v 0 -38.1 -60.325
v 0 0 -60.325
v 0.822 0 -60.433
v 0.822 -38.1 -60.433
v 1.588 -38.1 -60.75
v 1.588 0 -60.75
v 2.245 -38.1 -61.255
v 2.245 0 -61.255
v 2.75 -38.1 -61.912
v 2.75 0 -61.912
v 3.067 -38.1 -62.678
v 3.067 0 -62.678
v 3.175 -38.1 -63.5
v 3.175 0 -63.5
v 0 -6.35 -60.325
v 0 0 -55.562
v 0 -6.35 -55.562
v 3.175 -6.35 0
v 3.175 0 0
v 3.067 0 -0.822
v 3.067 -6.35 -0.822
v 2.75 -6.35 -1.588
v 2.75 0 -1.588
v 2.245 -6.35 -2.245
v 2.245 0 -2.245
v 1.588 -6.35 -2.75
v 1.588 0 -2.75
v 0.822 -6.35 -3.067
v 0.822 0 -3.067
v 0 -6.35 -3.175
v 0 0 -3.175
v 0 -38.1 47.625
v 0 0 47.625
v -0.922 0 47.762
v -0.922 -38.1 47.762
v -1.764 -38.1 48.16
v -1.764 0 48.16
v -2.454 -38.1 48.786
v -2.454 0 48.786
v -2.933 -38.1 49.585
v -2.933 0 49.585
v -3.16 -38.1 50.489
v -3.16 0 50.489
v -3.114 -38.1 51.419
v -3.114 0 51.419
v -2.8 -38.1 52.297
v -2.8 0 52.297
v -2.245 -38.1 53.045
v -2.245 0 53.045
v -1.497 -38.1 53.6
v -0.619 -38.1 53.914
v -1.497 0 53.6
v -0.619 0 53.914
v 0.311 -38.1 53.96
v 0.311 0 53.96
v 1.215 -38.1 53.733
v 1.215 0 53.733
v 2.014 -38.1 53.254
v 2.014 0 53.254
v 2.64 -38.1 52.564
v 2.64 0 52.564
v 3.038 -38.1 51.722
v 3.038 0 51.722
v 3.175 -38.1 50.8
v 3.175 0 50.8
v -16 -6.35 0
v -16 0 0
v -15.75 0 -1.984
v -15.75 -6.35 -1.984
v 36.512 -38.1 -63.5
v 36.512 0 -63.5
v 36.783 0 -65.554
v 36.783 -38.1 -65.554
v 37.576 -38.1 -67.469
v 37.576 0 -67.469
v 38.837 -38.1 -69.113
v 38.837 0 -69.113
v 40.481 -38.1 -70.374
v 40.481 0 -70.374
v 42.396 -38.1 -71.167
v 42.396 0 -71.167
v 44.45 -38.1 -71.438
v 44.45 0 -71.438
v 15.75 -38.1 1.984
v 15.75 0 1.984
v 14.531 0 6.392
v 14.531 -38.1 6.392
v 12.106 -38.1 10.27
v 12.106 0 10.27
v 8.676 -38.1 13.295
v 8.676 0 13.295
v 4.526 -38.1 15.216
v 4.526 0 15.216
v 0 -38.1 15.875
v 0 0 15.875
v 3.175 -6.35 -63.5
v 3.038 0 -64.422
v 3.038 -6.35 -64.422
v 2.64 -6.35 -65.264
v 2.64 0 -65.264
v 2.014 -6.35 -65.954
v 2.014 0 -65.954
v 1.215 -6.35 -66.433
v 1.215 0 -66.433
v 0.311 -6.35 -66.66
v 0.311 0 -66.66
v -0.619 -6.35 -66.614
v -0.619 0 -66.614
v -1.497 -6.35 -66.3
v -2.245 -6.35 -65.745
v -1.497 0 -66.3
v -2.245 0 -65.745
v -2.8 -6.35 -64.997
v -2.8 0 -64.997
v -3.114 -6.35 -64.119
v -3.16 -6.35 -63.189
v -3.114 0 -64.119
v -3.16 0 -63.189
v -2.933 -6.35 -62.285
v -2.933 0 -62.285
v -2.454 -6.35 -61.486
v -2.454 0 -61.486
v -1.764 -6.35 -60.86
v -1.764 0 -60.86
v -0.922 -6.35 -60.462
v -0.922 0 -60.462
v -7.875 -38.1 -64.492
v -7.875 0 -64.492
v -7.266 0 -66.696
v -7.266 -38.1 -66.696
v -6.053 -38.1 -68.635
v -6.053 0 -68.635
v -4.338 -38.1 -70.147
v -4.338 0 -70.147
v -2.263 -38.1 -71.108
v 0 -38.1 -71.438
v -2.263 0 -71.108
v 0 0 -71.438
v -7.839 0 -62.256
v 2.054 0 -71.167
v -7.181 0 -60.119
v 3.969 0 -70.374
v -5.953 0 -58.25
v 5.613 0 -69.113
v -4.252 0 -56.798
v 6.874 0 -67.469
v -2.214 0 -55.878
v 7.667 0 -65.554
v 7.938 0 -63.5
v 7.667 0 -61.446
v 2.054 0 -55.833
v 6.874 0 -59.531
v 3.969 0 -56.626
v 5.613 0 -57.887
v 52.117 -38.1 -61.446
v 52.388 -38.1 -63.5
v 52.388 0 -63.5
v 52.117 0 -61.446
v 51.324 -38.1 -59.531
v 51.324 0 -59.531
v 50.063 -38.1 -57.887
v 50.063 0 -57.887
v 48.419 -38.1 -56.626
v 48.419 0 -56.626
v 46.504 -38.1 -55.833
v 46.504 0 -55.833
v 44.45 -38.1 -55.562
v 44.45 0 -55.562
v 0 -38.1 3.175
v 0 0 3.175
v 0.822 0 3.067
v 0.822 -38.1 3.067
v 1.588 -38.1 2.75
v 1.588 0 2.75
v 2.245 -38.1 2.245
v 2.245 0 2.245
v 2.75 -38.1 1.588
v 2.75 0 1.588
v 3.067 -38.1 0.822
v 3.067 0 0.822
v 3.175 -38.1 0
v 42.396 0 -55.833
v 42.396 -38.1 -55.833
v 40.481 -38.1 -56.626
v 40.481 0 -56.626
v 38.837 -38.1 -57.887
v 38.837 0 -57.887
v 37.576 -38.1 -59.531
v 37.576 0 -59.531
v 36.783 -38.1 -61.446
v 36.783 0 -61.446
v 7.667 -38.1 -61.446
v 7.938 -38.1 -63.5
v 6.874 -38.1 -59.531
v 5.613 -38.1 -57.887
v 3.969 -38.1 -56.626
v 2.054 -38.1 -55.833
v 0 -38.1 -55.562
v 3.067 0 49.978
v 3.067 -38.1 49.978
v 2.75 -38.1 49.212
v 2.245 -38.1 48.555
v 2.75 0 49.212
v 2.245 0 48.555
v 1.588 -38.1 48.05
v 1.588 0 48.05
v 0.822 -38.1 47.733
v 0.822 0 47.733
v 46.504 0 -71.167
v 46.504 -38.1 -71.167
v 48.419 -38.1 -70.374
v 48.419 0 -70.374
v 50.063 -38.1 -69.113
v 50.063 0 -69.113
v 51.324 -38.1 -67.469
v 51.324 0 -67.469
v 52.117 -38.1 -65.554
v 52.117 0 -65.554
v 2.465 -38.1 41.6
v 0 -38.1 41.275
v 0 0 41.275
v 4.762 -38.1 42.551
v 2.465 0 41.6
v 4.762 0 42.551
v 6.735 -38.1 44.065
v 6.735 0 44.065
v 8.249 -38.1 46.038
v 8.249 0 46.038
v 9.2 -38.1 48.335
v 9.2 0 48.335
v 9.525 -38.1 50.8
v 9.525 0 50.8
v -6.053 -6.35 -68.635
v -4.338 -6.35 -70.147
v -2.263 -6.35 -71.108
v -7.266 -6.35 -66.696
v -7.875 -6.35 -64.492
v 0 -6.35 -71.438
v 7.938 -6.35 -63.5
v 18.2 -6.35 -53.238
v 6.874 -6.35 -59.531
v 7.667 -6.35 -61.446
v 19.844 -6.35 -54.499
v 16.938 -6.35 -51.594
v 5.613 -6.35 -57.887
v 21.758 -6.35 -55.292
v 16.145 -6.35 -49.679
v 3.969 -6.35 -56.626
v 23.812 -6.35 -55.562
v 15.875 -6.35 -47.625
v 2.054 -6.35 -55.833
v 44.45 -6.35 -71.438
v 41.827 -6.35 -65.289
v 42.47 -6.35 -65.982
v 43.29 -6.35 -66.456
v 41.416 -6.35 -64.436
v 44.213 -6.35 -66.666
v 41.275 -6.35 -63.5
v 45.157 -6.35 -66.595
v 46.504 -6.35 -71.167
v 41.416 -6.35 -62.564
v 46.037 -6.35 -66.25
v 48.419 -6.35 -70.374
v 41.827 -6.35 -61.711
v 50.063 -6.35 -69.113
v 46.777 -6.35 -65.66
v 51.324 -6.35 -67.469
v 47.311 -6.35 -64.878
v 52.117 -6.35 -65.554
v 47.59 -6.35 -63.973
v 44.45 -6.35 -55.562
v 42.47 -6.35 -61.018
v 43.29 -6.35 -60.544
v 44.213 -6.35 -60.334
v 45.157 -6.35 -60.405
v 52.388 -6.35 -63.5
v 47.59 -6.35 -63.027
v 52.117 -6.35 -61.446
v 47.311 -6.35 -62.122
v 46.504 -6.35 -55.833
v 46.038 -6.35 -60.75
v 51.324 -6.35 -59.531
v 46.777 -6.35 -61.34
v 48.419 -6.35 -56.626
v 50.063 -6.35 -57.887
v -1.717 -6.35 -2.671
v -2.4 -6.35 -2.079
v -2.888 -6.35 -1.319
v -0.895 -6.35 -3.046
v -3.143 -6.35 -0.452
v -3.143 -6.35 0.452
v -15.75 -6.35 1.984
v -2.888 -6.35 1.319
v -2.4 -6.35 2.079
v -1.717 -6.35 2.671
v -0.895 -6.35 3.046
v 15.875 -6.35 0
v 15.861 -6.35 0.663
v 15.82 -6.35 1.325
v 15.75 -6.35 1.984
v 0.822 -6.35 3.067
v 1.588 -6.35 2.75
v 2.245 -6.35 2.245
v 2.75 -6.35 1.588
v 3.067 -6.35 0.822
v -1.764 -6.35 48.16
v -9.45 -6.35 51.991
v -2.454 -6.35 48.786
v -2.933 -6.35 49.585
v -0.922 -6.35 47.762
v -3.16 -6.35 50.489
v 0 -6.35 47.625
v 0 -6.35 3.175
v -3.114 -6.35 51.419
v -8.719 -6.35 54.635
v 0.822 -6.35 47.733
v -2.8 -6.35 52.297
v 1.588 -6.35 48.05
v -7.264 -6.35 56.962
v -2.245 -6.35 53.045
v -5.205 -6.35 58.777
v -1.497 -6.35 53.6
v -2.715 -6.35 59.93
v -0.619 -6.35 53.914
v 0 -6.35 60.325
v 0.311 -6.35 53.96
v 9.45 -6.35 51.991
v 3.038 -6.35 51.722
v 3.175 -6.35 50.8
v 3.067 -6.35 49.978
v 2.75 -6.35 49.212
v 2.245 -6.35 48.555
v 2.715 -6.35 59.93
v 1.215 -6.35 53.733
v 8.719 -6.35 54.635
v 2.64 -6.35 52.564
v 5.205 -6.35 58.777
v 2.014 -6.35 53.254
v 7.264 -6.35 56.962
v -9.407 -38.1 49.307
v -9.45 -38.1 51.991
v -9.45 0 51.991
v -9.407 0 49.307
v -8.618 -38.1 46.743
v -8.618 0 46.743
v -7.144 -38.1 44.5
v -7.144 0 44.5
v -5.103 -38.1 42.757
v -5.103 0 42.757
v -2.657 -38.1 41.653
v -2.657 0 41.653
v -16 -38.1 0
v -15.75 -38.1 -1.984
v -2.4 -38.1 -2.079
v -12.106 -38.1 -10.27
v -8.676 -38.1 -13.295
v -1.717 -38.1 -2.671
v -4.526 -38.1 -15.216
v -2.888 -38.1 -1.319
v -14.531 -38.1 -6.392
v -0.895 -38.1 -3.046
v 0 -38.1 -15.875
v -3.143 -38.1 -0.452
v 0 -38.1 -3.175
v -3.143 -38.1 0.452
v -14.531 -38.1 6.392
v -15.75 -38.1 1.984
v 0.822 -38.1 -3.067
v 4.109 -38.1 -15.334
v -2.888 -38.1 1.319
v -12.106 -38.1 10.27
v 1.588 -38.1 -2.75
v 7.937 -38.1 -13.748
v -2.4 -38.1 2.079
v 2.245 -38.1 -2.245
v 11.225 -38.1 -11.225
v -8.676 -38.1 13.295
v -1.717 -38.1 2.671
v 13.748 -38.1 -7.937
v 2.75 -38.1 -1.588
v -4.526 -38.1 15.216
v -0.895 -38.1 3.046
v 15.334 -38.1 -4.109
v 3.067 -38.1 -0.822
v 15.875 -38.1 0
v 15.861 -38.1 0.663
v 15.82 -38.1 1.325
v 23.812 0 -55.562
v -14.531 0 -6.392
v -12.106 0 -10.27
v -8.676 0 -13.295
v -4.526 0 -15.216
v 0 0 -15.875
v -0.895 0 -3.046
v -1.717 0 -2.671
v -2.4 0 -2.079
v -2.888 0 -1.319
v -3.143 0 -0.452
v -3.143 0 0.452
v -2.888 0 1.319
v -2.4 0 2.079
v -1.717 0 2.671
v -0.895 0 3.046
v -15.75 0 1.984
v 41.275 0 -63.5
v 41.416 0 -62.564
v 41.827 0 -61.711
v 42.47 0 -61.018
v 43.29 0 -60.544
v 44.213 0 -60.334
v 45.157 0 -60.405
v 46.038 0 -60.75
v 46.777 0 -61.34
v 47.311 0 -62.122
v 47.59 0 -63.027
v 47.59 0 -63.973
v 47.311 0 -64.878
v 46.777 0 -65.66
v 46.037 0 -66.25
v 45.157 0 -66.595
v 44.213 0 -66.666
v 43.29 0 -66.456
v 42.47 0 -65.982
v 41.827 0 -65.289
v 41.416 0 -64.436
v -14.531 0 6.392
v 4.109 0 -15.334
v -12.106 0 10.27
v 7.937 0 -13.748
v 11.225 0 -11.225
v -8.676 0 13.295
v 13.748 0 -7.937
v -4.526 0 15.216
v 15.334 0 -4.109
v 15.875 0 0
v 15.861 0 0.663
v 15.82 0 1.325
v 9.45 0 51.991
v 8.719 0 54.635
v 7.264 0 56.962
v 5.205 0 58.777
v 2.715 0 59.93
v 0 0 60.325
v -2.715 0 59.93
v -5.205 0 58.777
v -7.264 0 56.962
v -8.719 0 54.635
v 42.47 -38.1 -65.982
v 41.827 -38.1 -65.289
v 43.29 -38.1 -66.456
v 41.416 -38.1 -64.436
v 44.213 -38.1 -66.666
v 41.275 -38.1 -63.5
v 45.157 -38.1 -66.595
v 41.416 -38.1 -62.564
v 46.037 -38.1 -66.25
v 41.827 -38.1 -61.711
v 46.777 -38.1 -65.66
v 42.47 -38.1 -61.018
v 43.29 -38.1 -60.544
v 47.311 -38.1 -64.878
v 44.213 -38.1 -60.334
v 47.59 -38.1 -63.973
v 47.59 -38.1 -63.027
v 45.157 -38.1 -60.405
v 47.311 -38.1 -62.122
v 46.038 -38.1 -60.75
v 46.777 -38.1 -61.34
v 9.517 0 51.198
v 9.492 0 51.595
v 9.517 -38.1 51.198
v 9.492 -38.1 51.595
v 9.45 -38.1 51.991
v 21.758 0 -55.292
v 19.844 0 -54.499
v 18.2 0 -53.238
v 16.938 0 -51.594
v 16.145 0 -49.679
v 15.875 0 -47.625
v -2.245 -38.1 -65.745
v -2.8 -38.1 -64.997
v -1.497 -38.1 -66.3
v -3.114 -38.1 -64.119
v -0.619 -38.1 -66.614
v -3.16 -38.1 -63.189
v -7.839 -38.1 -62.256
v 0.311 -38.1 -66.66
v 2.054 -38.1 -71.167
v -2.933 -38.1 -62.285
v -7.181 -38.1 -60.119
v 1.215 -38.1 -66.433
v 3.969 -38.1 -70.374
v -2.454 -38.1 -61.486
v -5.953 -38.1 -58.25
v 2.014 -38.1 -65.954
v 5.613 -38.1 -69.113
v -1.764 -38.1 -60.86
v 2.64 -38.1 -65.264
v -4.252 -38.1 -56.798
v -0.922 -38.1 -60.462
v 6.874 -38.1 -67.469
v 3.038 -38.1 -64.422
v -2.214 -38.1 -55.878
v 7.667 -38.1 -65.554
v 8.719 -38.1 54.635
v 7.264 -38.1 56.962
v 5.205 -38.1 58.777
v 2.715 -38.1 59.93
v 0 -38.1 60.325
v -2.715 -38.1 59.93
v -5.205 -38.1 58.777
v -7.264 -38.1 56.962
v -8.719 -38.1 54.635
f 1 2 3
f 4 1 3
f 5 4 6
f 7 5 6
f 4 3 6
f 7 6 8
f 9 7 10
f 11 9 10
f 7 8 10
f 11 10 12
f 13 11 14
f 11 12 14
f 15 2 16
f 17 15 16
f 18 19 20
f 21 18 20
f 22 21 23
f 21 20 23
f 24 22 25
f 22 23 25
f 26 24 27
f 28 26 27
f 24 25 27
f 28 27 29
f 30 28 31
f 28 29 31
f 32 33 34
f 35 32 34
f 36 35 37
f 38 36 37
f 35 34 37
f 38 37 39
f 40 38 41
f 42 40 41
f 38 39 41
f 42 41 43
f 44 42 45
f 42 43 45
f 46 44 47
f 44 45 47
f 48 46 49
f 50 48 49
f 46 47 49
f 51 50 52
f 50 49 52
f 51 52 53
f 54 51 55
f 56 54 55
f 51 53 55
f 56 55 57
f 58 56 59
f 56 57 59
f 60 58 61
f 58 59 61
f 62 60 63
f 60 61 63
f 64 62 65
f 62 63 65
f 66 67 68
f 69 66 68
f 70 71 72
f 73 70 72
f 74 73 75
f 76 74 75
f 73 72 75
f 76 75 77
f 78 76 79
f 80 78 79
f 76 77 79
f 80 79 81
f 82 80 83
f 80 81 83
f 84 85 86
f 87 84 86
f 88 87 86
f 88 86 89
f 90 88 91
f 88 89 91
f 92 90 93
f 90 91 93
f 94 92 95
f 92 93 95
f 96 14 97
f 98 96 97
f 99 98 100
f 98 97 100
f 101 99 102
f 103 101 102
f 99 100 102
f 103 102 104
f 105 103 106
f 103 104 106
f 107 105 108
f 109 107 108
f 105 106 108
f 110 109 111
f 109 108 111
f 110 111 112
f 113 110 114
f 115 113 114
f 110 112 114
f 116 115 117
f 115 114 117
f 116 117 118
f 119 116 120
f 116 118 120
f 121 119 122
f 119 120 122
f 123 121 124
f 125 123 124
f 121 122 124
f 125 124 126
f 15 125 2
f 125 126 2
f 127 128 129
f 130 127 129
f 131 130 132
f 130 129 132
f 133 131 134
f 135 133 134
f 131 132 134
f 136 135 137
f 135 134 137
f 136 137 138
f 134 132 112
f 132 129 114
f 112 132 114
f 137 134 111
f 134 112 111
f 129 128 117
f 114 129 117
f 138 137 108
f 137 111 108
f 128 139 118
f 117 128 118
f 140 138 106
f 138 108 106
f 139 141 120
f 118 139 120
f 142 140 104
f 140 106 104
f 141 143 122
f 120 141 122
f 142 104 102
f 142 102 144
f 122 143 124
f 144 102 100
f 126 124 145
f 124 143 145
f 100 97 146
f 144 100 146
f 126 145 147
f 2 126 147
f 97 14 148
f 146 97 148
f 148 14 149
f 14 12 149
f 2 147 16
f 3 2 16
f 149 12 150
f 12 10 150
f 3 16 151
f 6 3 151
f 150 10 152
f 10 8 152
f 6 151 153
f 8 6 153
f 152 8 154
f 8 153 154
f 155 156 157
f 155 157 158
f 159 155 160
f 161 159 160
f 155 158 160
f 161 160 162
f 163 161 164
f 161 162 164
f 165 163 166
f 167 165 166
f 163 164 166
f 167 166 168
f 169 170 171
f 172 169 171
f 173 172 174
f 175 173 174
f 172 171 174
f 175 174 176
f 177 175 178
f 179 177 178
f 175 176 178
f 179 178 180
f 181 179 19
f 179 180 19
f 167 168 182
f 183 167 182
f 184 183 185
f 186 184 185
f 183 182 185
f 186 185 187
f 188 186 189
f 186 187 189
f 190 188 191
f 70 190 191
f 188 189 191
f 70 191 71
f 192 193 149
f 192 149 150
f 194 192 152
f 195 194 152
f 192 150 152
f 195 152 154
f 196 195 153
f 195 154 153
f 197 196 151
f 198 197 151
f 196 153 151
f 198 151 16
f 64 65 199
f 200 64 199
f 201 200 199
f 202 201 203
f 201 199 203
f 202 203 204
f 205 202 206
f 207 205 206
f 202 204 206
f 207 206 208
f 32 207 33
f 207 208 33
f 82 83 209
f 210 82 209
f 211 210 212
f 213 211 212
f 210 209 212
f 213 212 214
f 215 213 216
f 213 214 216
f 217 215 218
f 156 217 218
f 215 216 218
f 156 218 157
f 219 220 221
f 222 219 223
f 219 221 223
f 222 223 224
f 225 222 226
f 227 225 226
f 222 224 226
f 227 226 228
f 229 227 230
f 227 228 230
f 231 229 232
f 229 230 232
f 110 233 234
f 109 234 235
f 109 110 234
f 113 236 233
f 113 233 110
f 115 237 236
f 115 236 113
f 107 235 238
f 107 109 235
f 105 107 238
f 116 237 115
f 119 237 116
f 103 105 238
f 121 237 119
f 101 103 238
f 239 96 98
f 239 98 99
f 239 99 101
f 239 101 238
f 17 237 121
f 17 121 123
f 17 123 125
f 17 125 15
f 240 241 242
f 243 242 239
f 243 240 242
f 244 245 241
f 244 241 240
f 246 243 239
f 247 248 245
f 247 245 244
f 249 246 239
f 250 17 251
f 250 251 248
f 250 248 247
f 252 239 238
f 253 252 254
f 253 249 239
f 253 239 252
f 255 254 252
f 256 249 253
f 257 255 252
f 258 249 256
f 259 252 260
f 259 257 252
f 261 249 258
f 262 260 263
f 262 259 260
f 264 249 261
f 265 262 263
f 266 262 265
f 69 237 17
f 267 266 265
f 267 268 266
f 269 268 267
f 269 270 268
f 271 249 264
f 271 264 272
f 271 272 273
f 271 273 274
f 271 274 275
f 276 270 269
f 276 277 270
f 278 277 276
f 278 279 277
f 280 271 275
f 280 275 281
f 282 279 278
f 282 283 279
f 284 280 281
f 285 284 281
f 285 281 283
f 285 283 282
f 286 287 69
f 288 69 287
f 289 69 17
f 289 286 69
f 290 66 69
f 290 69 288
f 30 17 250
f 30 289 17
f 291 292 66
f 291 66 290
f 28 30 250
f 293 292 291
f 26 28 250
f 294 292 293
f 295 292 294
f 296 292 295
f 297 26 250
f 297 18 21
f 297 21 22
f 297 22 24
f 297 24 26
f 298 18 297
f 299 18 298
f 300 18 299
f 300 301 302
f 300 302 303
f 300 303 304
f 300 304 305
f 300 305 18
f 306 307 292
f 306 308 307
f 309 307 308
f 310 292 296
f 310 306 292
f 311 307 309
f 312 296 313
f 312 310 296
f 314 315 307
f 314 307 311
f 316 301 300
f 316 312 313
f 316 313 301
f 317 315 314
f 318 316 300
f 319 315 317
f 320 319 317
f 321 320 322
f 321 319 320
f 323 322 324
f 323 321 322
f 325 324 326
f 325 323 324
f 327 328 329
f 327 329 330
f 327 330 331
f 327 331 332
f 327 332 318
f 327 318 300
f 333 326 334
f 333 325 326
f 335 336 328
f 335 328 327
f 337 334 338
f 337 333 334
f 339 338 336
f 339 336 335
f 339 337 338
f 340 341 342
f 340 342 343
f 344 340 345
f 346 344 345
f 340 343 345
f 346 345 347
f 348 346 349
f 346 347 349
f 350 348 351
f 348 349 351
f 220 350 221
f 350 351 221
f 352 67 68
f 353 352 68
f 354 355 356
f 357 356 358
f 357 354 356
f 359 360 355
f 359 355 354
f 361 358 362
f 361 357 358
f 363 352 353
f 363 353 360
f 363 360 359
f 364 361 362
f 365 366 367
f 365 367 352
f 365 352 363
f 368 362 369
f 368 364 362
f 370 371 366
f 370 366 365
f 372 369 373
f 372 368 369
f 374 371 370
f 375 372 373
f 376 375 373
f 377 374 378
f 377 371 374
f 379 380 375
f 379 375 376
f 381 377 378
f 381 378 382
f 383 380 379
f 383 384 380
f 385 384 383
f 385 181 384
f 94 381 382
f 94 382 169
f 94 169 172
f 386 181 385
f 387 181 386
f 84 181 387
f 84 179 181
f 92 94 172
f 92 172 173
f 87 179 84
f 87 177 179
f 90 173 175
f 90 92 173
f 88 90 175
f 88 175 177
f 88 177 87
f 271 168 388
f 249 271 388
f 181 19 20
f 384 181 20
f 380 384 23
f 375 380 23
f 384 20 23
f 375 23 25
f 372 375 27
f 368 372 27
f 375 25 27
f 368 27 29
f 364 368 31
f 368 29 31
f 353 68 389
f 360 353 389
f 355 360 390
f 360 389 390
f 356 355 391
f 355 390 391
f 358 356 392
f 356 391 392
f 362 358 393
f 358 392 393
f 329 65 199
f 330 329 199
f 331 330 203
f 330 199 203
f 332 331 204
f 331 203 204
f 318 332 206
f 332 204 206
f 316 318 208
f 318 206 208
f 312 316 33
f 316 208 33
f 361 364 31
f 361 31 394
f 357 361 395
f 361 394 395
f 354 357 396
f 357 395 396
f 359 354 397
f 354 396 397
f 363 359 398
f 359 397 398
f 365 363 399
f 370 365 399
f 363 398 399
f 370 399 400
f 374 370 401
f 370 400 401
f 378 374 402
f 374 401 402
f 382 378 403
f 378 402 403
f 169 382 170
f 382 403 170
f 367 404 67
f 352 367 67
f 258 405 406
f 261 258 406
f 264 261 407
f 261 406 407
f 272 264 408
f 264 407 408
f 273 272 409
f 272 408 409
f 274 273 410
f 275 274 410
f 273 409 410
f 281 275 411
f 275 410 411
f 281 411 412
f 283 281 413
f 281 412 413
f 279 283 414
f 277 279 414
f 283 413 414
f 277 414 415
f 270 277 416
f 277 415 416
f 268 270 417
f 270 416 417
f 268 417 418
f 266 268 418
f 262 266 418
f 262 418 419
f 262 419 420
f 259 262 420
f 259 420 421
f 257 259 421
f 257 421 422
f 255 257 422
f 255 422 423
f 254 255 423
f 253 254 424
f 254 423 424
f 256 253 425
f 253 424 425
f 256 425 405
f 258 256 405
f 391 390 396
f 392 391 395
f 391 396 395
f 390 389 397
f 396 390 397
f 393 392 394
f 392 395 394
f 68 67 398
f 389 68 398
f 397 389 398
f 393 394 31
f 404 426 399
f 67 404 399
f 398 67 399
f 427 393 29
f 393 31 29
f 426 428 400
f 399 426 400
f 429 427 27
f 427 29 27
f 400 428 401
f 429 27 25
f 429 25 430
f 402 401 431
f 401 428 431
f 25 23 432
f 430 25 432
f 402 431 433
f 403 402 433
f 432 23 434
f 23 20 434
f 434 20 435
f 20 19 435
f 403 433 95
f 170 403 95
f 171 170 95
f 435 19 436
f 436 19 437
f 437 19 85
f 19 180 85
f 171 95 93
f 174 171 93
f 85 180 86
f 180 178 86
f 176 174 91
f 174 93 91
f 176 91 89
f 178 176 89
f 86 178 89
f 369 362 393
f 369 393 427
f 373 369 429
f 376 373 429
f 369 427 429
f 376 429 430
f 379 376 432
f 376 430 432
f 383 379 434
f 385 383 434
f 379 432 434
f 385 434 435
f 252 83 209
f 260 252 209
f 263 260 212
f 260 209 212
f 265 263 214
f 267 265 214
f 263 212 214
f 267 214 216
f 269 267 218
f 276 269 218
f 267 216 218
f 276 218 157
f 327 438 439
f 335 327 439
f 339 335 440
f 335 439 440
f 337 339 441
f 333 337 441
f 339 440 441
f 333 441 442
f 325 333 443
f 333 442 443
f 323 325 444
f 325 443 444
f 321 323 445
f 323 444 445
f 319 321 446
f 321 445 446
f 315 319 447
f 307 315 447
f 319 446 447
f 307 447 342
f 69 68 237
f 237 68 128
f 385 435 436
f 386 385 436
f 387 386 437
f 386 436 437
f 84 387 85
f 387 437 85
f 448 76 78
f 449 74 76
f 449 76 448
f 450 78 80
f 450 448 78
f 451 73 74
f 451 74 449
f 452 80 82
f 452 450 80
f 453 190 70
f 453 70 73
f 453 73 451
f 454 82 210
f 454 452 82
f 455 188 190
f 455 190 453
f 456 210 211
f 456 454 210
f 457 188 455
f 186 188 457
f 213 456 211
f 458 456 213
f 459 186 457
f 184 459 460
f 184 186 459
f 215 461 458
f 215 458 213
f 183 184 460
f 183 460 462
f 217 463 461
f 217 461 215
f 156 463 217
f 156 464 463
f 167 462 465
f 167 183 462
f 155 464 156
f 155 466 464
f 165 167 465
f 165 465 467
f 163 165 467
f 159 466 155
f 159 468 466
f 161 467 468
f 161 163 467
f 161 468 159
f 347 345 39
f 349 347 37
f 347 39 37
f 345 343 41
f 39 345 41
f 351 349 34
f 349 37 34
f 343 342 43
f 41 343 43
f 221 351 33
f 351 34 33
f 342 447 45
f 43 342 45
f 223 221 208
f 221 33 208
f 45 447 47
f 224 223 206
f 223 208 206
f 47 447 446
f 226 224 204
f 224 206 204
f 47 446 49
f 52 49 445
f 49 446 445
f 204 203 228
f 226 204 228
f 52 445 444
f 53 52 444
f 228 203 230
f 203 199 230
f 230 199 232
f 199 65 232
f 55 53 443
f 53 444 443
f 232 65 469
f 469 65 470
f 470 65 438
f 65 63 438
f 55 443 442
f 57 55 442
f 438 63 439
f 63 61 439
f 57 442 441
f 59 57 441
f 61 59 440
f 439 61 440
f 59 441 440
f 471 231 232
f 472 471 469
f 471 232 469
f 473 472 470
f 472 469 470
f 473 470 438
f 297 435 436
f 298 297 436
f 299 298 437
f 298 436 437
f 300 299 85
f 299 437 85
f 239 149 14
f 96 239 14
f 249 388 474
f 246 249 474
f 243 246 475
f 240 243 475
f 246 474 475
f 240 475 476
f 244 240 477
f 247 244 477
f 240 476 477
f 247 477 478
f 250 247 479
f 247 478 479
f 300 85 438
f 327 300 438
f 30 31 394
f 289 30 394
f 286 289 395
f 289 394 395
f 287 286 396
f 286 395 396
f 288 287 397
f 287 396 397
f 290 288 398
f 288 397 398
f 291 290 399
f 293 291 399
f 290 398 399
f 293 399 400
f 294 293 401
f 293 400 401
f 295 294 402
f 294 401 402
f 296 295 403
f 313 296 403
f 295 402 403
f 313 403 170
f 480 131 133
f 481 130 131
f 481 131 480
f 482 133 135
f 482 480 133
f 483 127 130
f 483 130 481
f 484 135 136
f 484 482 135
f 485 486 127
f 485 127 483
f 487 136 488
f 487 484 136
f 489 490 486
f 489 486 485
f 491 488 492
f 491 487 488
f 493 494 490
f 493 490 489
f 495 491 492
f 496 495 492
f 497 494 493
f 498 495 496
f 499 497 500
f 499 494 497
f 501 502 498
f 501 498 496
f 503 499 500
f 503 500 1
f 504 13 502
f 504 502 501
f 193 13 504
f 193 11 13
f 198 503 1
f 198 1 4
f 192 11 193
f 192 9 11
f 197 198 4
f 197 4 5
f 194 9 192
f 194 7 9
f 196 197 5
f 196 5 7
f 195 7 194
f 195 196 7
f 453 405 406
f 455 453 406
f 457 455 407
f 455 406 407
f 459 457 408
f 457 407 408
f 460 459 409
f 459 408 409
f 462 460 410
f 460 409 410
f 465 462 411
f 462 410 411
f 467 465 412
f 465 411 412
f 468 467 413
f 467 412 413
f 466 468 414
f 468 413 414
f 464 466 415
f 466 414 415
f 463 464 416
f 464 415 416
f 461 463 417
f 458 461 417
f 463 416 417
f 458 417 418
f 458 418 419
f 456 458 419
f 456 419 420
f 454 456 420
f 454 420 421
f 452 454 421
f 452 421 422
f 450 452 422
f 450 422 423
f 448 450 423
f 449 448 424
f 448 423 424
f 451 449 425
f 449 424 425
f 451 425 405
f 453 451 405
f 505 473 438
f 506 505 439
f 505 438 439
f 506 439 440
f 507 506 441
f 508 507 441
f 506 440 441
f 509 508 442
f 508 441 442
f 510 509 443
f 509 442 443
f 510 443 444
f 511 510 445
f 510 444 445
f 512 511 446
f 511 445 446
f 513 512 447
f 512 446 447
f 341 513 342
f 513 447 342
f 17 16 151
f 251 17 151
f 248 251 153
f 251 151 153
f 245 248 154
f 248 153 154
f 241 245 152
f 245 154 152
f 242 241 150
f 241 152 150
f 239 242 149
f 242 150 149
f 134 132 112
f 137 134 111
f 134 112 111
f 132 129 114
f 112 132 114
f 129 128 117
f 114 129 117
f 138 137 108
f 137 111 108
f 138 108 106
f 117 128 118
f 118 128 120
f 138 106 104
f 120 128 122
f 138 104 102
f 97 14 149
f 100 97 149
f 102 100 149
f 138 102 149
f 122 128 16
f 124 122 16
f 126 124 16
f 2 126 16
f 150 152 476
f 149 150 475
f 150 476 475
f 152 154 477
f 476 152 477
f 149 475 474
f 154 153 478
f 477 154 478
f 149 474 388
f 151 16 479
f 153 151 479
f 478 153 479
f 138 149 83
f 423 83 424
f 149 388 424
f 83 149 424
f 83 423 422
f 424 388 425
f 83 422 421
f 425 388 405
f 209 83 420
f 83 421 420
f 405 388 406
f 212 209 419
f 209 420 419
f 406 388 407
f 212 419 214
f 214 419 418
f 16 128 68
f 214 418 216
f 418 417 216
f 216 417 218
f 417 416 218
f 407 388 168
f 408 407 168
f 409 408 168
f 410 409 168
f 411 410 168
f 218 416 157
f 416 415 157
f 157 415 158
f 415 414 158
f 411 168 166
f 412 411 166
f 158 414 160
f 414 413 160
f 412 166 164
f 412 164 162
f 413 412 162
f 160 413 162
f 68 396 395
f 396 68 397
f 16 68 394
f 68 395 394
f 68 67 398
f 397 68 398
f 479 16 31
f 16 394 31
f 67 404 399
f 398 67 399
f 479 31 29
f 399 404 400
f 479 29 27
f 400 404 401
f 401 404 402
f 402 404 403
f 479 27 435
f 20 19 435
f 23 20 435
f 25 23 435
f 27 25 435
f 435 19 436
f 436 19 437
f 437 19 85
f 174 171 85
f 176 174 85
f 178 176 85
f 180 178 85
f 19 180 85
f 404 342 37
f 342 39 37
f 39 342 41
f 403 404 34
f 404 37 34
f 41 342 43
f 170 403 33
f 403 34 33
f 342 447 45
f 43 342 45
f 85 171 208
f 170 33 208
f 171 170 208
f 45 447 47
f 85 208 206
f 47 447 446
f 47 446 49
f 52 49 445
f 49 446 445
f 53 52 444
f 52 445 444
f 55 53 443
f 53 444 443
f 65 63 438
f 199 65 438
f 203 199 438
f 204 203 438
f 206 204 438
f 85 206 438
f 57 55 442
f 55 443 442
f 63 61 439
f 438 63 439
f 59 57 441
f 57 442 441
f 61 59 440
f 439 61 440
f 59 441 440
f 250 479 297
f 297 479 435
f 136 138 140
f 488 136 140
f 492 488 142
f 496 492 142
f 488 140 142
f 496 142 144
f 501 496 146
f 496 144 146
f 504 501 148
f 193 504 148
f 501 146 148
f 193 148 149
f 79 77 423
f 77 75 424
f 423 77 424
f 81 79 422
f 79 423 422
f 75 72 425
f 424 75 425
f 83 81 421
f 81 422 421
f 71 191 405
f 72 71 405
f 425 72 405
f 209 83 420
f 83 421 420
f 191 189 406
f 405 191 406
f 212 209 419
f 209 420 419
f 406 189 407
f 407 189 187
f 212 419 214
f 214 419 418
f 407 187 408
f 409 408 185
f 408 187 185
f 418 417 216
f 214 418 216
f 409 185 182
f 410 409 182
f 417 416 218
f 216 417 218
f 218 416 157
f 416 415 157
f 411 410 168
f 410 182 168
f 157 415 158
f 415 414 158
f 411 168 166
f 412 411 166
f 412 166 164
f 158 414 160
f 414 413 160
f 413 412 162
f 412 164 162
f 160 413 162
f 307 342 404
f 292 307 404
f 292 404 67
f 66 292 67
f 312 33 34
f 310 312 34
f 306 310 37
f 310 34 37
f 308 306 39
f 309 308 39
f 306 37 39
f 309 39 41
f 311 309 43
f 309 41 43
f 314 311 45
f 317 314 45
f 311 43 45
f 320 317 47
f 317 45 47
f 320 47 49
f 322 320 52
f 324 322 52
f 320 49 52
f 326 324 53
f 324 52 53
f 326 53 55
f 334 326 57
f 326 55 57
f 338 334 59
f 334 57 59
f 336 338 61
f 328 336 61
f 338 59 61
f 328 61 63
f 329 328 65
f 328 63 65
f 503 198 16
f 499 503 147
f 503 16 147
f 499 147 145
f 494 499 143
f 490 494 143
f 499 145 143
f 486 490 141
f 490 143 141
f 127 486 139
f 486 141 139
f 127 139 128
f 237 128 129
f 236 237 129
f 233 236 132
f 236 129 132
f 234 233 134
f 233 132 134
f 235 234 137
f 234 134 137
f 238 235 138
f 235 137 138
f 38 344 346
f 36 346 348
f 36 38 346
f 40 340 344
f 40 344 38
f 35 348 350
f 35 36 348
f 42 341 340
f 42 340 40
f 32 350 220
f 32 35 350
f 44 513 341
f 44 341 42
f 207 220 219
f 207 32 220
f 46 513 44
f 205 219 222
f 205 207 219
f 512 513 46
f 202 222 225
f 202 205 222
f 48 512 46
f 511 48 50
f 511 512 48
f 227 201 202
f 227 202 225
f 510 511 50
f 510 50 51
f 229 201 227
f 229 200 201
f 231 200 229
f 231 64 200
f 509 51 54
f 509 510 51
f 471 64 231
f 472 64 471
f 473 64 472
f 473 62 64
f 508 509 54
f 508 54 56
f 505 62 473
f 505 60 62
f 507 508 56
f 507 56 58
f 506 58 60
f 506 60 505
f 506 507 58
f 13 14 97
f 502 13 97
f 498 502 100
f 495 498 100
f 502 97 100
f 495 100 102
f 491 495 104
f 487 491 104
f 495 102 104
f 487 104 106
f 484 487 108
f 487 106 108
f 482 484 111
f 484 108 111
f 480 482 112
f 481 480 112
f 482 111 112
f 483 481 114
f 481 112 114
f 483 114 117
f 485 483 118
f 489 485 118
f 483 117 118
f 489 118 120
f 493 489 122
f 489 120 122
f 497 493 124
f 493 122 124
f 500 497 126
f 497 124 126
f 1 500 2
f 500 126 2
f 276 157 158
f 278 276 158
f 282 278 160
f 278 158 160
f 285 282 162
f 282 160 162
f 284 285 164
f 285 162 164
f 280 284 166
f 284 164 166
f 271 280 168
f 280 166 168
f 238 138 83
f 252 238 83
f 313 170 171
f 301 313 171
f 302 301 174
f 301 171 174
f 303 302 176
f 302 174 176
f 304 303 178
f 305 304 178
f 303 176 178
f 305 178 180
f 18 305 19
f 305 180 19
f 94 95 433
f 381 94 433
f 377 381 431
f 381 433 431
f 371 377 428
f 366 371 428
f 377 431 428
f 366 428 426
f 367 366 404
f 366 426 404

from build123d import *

# Parameters (mm, degrees)
F1_DEPTH = 38.1
F2_DEPTH = 6.35


with BuildPart() as f1:
    # F0 (on Front) → F1 (new body)
    with BuildSketch(Plane.XZ):
        with BuildLine():
            Line((-16.0004960241, 0), (-15.7504882823, -1.9843749313))
            ThreePointArc((-15.7504882823, -1.9843749313), (-15.875, -3.16e-08), (-15.7504882902, 1.9843748686))
            Line((-15.7504882902, 1.9843748686), (-16.0004960241, 0))
        make_face()
        with BuildLine():
            ThreePointArc((0, -15.875), (11.2253201513, -11.2253201513), (15.875, 0))
            ThreePointArc((15.875, 0), (15.8438414895, 0.9941387503), (15.7504882702, 1.9843750273))
            ThreePointArc((15.7504882702, 1.9843750273), (10.5003255055, 11.9062500091), (0, 15.875))
            Line((0, 15.875), (0, 3.175))
            ThreePointArc((0, 3.175), (2.2450640303, 2.2450640303), (3.175, 0))
            ThreePointArc((3.175, 0), (2.2450640303, -2.2450640303), (0, -3.175))
            Line((0, -3.175), (0, -15.875))
        make_face()
        with BuildLine():
            ThreePointArc((-15.7504882823, -1.9843749313), (-10.5003255418, -11.9062499771), (0, -15.875))
            Line((0, -15.875), (0, -3.175))
            ThreePointArc((0, -3.175), (-3.175, 0), (0, 3.175))
            Line((0, 3.175), (0, 15.875))
            ThreePointArc((0, 15.875), (-10.5003255655, 11.9062499562), (-15.7504882902, 1.9843748686))
            ThreePointArc((-15.7504882902, 1.9843748686), (-15.875, -3.16e-08), (-15.7504882823, -1.9843749313))
        make_face()
    extrude(amount=F1_DEPTH)


with BuildPart() as f1b:
    # F0 (on Front) → F1, piece 2 (new body)
    with BuildSketch(Plane.XZ):
        with BuildLine():
            ThreePointArc((9.525, 50.8), (9.5063048942, 51.396483242), (9.4502929642, 51.990625))
            ThreePointArc((9.4502929642, 51.990625), (0, 60.325), (-9.4502929642, 51.990625))
            ThreePointArc((-9.4502929642, 51.990625), (-7.14375, 44.4998046905), (0, 41.275))
            ThreePointArc((0, 41.275), (6.7351920908, 44.0648079092), (9.525, 50.8))
        make_face()
        with BuildLine():
            ThreePointArc((3.175, 50.8), (2.2450640303, 48.5549359697), (0, 47.625))
            ThreePointArc((0, 47.625), (-2.2450640303, 53.0450640303), (3.175, 50.8))
        make_face(mode=Mode.SUBTRACT)
    extrude(amount=F1_DEPTH)


with BuildPart() as f1c:
    # F0 (on Front) → F1, piece 3 (new body)
    with BuildSketch(Plane.XZ):
        with BuildLine():
            ThreePointArc((52.3875, -63.5), (50.0626600757, -57.8873399243), (44.45, -55.5625))
            ThreePointArc((44.45, -55.5625), (38.8373399243, -57.8873399243), (36.5125, -63.5))
            ThreePointArc((36.5125, -63.5), (38.8373399243, -69.1126600757), (44.45, -71.4375))
            ThreePointArc((44.45, -71.4375), (50.0626600757, -69.1126600757), (52.3875, -63.5))
        make_face()
        with BuildLine():
            ThreePointArc((47.625, -63.5), (44.45, -66.675), (41.275, -63.5))
            ThreePointArc((41.275, -63.5), (44.45, -60.325), (47.625, -63.5))
        make_face(mode=Mode.SUBTRACT)
    extrude(amount=F1_DEPTH)


with BuildPart() as f1d:
    # F0 (on Front) → F1, piece 4 (new body)
    with BuildSketch(Plane.XZ):
        with BuildLine():
            Line((0, -60.325), (0, -55.5625))
            ThreePointArc((0, -55.5625), (-5.953125, -58.2498372421), (-7.8752441368, -64.4921875))
            ThreePointArc((-7.8752441368, -64.4921875), (-5.2501627579, -69.453125), (0, -71.4375))
            ThreePointArc((0, -71.4375), (5.6126600757, -69.1126600757), (7.9375, -63.5))
            Line((7.9375, -63.5), (3.175, -63.5))
            ThreePointArc((3.175, -63.5), (-2.2450640303, -65.7450640303), (0, -60.325))
        make_face()
        with BuildLine():
            ThreePointArc((7.9375, -63.5), (5.6126600757, -57.8873399243), (0, -55.5625))
            Line((0, -55.5625), (0, -60.325))
            ThreePointArc((0, -60.325), (2.2450640303, -61.2549359697), (3.175, -63.5))
            Line((3.175, -63.5), (7.9375, -63.5))
        make_face()
    extrude(amount=F1_DEPTH)


with BuildPart() as f2:
    # F0 (on Front) → F2 (new body)
    with BuildSketch(Plane.XZ):
        with BuildLine():
            ThreePointArc((0, -15.875), (11.2253201513, -11.2253201513), (15.875, 0))
            ThreePointArc((15.875, 0), (15.8438414895, 0.9941387503), (15.7504882702, 1.9843750273))
            ThreePointArc((15.7504882702, 1.9843750273), (10.5003255055, 11.9062500091), (0, 15.875))
            Line((0, 15.875), (0, 3.175))
            ThreePointArc((0, 3.175), (2.2450640303, 2.2450640303), (3.175, 0))
            ThreePointArc((3.175, 0), (2.2450640303, -2.2450640303), (0, -3.175))
            Line((0, -3.175), (0, -15.875))
        make_face()
        with BuildLine():
            Line((15.875, -47.625), (15.875, 0))
            ThreePointArc((15.875, 0), (11.2253201513, -11.2253201513), (0, -15.875))
            Line((0, -15.875), (0, -55.5625))
            ThreePointArc((0, -55.5625), (5.6126600757, -57.8873399243), (7.9375, -63.5))
            Line((7.9375, -63.5), (36.5125, -63.5))
            ThreePointArc((36.5125, -63.5), (38.8373399243, -57.8873399243), (44.45, -55.5625))
            Line((44.45, -55.5625), (23.8125, -55.5625))
            ThreePointArc((23.8125, -55.5625), (18.1998399243, -53.2376600757), (15.875, -47.625))
        make_face()
        with BuildLine():
            ThreePointArc((0, 15.875), (10.5003255055, 11.9062500091), (15.7504882702, 1.9843750273))
            Line((15.7504882702, 1.9843750273), (9.4502929642, 51.990625))
            ThreePointArc((9.4502929642, 51.990625), (9.5063048942, 51.396483242), (9.525, 50.8))
            ThreePointArc((9.525, 50.8), (6.7351920908, 44.0648079092), (0, 41.275))
            Line((0, 41.275), (0, 15.875))
        make_face()
        with BuildLine():
            Line((0, -55.5625), (0, -15.875))
            ThreePointArc((0, -15.875), (-10.5003255418, -11.9062499771), (-15.7504882823, -1.9843749313))
            Line((-15.7504882823, -1.9843749313), (-7.8752441368, -64.4921875))
            ThreePointArc((-7.8752441368, -64.4921875), (-5.953125, -58.2498372421), (0, -55.5625))
        make_face()
        with BuildLine():
            ThreePointArc((-15.7504882823, -1.9843749313), (-10.5003255418, -11.9062499771), (0, -15.875))
            Line((0, -15.875), (0, -3.175))
            ThreePointArc((0, -3.175), (-3.175, 0), (0, 3.175))
            Line((0, 3.175), (0, 15.875))
            ThreePointArc((0, 15.875), (-10.5003255655, 11.9062499562), (-15.7504882902, 1.9843748686))
            ThreePointArc((-15.7504882902, 1.9843748686), (-15.875, -3.16e-08), (-15.7504882823, -1.9843749313))
        make_face()
        with BuildLine():
            ThreePointArc((-15.7504882902, 1.9843748686), (-10.5003255655, 11.9062499562), (0, 15.875))
            Line((0, 15.875), (0, 41.275))
            ThreePointArc((0, 41.275), (-7.14375, 44.4998046905), (-9.4502929642, 51.990625))
            Line((-9.4502929642, 51.990625), (-15.7504882902, 1.9843748686))
        make_face()
        with BuildLine():
            ThreePointArc((9.525, 50.8), (9.5063048942, 51.396483242), (9.4502929642, 51.990625))
            ThreePointArc((9.4502929642, 51.990625), (0, 60.325), (-9.4502929642, 51.990625))
            ThreePointArc((-9.4502929642, 51.990625), (-7.14375, 44.4998046905), (0, 41.275))
            ThreePointArc((0, 41.275), (6.7351920908, 44.0648079092), (9.525, 50.8))
        make_face()
        with BuildLine():
            ThreePointArc((3.175, 50.8), (2.2450640303, 48.5549359697), (0, 47.625))
            ThreePointArc((0, 47.625), (-2.2450640303, 53.0450640303), (3.175, 50.8))
        make_face(mode=Mode.SUBTRACT)
        with BuildLine():
            Line((-16.0004960241, 0), (-15.7504882823, -1.9843749313))
            ThreePointArc((-15.7504882823, -1.9843749313), (-15.875, -3.16e-08), (-15.7504882902, 1.9843748686))
            Line((-15.7504882902, 1.9843748686), (-16.0004960241, 0))
        make_face()
        with BuildLine():
            Line((0, -60.325), (0, -55.5625))
            ThreePointArc((0, -55.5625), (-5.953125, -58.2498372421), (-7.8752441368, -64.4921875))
            ThreePointArc((-7.8752441368, -64.4921875), (-5.2501627579, -69.453125), (0, -71.4375))
            ThreePointArc((0, -71.4375), (5.6126600757, -69.1126600757), (7.9375, -63.5))
            Line((7.9375, -63.5), (3.175, -63.5))
            ThreePointArc((3.175, -63.5), (-2.2450640303, -65.7450640303), (0, -60.325))
        make_face()
        with BuildLine():
            Line((36.5125, -63.5), (7.9375, -63.5))
            ThreePointArc((7.9375, -63.5), (5.6126600757, -69.1126600757), (0, -71.4375))
            Line((0, -71.4375), (44.45, -71.4375))
            ThreePointArc((44.45, -71.4375), (38.8373399243, -69.1126600757), (36.5125, -63.5))
        make_face()
        with BuildLine():
            ThreePointArc((52.3875, -63.5), (50.0626600757, -57.8873399243), (44.45, -55.5625))
            ThreePointArc((44.45, -55.5625), (38.8373399243, -57.8873399243), (36.5125, -63.5))
            ThreePointArc((36.5125, -63.5), (38.8373399243, -69.1126600757), (44.45, -71.4375))
            ThreePointArc((44.45, -71.4375), (50.0626600757, -69.1126600757), (52.3875, -63.5))
        make_face()
        with BuildLine():
            ThreePointArc((47.625, -63.5), (44.45, -66.675), (41.275, -63.5))
            ThreePointArc((41.275, -63.5), (44.45, -60.325), (47.625, -63.5))
        make_face(mode=Mode.SUBTRACT)
    extrude(amount=F2_DEPTH)


solid = Compound([f1.part, f1b.part, f1c.part, f1d.part, f2.part])
